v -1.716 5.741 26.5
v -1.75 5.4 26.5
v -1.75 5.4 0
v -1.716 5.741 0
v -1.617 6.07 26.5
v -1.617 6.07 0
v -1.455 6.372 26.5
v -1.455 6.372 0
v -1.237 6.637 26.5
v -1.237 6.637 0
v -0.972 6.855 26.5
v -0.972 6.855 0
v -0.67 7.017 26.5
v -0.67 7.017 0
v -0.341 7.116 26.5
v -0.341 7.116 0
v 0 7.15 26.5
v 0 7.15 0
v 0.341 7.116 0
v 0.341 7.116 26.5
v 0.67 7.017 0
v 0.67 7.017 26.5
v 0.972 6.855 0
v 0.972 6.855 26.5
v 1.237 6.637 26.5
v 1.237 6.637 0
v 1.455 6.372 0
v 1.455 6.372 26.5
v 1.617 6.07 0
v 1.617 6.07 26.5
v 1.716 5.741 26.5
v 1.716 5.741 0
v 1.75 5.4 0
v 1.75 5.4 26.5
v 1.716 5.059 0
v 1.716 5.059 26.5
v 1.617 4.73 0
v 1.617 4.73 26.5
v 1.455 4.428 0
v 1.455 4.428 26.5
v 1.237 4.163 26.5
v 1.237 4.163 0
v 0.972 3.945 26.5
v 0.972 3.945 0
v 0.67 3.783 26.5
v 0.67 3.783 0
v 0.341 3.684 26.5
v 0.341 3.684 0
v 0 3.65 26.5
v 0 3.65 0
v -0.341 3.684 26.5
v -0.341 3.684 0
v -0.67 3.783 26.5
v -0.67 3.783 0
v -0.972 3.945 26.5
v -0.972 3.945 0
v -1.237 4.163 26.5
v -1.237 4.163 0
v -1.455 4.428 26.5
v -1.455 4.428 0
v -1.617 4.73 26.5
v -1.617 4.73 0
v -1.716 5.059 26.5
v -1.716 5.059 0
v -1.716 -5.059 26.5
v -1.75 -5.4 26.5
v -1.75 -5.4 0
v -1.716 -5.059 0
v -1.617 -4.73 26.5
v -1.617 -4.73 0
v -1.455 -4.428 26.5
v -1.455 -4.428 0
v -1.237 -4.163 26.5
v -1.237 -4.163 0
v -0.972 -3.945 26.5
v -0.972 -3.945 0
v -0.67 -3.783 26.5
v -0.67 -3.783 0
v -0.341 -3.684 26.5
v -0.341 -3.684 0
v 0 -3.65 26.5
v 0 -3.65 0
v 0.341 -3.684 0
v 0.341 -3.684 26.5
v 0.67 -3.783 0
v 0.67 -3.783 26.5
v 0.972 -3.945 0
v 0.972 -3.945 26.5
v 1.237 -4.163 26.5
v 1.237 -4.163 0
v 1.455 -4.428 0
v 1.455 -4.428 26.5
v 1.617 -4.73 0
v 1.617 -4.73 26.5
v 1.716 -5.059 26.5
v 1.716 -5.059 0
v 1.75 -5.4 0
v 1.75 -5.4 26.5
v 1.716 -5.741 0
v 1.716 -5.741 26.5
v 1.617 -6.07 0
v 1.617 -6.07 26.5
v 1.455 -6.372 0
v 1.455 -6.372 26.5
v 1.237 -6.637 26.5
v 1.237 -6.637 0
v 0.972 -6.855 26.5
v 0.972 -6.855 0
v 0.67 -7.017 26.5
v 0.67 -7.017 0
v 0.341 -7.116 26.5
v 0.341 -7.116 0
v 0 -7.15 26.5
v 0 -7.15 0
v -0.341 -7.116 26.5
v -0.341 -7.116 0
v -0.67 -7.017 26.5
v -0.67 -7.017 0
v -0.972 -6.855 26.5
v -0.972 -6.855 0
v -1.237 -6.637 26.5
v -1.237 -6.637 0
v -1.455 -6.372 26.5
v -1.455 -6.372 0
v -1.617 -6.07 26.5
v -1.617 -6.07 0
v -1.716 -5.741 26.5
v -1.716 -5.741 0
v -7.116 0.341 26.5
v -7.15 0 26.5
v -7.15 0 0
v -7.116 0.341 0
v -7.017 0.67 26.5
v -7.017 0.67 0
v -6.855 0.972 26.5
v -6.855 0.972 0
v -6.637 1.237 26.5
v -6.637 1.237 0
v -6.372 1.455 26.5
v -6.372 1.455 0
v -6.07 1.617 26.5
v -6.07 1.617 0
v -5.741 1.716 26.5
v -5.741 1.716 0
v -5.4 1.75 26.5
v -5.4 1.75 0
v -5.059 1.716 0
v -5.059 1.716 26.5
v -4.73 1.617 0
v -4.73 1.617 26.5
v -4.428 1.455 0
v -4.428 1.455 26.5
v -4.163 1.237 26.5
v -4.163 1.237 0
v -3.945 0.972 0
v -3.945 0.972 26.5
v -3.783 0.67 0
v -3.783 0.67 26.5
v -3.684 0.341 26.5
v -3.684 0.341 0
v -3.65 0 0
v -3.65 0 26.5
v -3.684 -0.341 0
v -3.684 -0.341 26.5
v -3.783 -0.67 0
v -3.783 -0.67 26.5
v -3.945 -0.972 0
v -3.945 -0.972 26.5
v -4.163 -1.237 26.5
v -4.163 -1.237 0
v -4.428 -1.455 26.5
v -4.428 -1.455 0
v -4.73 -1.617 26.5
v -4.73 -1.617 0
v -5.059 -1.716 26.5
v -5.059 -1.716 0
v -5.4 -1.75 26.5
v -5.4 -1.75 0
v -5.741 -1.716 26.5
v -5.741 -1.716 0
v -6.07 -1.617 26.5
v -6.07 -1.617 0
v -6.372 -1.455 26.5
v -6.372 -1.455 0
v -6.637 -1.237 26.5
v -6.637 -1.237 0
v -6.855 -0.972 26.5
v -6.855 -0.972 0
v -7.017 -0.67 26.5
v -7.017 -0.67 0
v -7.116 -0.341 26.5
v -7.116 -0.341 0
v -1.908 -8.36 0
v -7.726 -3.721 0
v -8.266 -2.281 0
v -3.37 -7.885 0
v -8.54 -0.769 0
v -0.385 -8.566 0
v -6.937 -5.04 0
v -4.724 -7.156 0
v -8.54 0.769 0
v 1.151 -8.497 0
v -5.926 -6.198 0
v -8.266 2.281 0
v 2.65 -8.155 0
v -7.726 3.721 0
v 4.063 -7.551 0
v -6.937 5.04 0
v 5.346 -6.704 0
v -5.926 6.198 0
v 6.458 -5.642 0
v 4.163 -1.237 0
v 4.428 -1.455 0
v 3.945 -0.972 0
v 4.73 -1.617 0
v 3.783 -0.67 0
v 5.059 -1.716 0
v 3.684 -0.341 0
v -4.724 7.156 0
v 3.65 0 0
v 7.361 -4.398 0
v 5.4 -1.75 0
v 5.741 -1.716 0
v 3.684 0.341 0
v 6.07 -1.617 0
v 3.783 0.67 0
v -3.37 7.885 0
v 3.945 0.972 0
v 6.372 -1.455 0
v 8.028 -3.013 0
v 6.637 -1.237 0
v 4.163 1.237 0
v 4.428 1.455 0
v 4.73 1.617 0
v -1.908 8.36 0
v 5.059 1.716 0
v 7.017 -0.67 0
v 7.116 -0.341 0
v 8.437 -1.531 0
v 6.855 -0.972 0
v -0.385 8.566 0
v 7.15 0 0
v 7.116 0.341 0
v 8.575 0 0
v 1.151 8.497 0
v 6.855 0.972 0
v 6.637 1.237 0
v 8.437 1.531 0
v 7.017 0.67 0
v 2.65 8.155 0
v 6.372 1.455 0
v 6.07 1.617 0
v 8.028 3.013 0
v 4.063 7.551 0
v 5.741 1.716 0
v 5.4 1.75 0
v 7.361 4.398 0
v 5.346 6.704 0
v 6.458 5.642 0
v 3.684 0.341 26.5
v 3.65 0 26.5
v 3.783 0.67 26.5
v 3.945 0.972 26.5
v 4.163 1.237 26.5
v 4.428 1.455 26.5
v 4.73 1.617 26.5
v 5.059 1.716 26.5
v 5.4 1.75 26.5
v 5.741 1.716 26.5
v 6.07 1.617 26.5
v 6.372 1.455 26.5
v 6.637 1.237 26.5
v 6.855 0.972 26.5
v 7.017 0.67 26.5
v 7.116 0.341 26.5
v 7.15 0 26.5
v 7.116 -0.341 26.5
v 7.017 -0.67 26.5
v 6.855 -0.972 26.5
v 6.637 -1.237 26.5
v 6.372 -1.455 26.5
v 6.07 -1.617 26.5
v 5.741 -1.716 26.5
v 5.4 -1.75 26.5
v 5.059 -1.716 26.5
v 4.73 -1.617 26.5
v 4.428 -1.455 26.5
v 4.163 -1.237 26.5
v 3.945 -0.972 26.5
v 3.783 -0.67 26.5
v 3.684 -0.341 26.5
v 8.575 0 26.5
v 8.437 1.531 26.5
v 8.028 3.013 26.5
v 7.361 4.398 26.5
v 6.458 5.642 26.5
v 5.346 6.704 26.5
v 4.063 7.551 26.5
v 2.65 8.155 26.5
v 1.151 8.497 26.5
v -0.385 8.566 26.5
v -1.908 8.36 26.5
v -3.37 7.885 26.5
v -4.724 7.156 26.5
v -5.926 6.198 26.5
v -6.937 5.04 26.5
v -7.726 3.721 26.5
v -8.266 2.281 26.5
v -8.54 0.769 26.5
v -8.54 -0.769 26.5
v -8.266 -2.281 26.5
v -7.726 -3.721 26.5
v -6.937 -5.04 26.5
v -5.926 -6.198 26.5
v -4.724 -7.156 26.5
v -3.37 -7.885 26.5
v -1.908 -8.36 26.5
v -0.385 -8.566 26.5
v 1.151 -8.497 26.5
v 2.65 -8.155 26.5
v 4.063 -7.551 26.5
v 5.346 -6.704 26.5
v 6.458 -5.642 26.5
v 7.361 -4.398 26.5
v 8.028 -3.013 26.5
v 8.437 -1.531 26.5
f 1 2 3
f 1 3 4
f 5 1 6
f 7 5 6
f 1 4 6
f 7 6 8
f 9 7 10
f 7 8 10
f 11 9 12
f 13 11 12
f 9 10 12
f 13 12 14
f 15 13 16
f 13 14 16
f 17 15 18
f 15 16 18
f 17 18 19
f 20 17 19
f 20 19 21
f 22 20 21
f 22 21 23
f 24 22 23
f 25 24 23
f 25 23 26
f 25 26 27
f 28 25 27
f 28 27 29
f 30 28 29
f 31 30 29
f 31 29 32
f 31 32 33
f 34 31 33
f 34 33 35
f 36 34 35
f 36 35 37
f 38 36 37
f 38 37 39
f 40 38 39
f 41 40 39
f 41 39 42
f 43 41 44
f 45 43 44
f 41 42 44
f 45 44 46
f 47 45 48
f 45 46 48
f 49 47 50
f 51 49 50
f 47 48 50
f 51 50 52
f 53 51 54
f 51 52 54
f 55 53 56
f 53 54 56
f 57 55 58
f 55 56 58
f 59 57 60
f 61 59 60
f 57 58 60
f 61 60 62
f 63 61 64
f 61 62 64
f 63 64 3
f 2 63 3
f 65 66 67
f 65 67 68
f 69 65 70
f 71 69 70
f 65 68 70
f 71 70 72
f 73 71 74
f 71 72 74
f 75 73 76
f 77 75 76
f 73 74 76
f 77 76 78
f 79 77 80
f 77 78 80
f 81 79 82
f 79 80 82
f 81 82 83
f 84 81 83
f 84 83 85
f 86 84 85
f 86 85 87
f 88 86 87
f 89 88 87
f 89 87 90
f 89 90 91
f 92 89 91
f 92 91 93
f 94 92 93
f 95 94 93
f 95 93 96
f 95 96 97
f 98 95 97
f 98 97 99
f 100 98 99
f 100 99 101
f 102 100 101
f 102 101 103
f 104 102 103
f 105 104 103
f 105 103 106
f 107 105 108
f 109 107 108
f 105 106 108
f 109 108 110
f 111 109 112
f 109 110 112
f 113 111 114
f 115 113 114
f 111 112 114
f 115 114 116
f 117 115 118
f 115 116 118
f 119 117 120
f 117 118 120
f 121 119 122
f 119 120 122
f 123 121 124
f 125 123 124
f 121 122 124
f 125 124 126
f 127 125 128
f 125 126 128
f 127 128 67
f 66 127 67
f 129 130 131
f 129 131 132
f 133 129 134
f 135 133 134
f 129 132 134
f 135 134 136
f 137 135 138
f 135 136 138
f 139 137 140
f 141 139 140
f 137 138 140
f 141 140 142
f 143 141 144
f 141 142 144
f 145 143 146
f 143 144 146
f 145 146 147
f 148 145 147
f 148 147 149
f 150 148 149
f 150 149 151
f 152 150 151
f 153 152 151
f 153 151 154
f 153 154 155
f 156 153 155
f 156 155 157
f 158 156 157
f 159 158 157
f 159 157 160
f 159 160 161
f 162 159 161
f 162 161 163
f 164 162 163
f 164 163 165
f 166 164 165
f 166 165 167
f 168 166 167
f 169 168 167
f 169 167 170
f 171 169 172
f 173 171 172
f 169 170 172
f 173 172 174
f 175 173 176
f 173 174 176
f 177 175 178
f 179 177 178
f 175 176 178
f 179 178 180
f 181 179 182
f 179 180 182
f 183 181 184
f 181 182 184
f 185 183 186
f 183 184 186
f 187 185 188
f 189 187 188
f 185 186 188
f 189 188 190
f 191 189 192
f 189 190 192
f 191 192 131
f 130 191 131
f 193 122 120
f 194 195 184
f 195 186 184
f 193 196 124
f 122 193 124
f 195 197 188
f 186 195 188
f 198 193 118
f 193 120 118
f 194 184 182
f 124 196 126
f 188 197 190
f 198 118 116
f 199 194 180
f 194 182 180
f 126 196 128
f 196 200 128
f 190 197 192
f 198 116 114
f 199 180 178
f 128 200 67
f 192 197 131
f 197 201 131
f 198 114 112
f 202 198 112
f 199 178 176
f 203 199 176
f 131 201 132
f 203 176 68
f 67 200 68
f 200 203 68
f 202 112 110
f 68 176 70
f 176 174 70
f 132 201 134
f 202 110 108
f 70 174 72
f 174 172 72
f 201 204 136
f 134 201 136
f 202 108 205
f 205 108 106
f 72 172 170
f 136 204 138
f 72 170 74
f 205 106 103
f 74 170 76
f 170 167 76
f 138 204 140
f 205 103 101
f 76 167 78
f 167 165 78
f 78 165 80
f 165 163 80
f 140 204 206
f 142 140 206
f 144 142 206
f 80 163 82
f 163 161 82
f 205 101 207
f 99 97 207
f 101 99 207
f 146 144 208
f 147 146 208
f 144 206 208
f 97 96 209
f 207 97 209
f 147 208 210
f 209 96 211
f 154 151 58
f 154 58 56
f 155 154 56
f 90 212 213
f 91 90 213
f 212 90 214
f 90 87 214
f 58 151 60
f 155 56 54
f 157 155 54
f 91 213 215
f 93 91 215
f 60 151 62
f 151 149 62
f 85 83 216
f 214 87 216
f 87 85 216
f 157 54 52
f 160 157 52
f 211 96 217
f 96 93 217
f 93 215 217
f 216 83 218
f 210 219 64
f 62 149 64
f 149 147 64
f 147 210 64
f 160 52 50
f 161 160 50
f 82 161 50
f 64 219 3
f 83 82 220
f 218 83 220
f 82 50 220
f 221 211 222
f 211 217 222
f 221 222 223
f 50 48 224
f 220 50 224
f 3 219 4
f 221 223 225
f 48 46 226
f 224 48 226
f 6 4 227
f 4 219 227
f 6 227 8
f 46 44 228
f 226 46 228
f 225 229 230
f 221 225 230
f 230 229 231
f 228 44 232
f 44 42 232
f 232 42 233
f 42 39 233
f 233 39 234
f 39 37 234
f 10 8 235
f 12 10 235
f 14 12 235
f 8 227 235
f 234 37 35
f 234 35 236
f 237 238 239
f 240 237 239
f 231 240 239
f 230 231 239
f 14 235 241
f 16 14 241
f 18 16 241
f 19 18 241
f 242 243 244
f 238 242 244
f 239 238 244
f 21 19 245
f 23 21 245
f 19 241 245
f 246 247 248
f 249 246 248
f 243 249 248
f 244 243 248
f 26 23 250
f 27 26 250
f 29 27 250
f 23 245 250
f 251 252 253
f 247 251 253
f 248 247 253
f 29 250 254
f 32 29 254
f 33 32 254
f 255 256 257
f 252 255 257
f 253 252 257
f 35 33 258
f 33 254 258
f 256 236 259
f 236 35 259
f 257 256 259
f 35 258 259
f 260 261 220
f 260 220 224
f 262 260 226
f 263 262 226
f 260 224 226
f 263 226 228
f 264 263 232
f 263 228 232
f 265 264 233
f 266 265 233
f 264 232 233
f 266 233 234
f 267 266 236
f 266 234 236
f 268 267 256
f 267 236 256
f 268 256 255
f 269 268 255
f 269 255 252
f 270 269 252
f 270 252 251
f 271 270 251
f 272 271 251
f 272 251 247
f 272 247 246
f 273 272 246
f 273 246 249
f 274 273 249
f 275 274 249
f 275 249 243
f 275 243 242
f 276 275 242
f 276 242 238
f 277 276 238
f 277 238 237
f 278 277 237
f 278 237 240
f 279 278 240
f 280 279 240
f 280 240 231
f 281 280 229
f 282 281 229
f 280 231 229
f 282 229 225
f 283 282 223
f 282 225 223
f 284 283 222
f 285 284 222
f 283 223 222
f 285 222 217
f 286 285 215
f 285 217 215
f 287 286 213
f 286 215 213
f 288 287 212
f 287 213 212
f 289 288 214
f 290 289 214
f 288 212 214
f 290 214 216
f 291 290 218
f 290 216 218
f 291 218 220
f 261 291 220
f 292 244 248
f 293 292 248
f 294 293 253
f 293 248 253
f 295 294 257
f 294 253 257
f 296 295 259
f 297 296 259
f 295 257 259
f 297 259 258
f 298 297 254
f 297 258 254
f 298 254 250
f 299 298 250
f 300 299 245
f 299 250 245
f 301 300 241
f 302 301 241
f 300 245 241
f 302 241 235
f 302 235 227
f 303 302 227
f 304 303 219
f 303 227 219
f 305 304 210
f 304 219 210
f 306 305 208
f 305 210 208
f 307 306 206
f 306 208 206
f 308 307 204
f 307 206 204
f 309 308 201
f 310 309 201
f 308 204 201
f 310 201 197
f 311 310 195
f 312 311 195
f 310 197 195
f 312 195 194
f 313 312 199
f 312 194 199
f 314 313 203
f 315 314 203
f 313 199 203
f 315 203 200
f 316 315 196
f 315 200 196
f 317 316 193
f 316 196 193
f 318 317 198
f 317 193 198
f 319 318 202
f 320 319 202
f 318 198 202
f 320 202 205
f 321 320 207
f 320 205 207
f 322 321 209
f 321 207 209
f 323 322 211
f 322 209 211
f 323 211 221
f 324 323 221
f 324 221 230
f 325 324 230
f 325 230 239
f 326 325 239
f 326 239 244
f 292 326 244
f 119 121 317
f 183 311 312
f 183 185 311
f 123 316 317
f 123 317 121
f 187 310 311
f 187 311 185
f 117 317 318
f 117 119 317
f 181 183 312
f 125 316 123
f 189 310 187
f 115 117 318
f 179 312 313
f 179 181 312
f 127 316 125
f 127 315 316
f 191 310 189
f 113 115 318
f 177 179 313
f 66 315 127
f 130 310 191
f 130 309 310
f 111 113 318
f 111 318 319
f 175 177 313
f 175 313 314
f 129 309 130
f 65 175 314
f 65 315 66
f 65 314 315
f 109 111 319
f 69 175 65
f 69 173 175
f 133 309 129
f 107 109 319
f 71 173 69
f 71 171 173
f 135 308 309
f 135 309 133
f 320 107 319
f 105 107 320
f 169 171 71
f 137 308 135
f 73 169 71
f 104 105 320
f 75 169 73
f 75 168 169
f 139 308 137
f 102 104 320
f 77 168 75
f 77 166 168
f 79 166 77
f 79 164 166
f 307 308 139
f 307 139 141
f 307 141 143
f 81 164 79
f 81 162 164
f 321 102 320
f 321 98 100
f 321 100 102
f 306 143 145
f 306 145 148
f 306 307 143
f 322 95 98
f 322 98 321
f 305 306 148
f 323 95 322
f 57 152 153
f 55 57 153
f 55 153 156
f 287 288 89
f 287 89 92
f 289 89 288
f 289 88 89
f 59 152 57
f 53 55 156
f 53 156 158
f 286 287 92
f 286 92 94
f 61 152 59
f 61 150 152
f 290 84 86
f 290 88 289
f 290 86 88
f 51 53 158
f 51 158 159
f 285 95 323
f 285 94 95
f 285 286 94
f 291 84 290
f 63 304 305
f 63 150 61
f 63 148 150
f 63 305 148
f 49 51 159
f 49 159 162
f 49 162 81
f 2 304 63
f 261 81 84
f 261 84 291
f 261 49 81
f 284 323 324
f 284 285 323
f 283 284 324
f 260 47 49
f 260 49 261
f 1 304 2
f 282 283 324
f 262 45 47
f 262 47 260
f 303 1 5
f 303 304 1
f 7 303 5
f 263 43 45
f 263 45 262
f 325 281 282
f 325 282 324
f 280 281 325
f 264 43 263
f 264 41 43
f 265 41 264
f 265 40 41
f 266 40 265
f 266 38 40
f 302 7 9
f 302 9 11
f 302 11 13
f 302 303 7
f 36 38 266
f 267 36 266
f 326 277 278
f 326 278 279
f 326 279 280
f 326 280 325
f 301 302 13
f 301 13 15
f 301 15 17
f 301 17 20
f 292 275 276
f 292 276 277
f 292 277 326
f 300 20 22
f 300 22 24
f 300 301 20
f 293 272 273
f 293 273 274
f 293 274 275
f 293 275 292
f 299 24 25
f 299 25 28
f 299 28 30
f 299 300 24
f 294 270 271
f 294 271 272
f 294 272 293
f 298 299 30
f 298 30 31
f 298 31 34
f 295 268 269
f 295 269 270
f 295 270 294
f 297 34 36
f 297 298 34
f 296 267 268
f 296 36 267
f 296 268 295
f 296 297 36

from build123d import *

# Parameters (mm, degrees)
F0_R     = 8.575
F1_DEPTH = 26.5
F3_D     = 3.5
F4_D     = 3.5
F5_D     = 3.5


with BuildPart() as f1:
    # F0 (on Top) → F1 (new body)
    with BuildSketch(Plane.XY):
        Circle(F0_R)
    extrude(amount=F1_DEPTH)

    # F3 (through all)
    with Locations(Plane.XY.offset(26.5)):
        with Locations((0, 5.4)):
            Hole(F3_D / 2)

    # F4 (through all)
    with Locations(Plane.XY.offset(26.5)):
        with Locations((5.4, 0)):
            Hole(F4_D / 2)

    # F5 (through all)
    with Locations(Plane.XY.offset(26.5)):
        with Locations((-5.4, 0), (0, -5.4)):
            Hole(F5_D / 2)


solid = f1.part
